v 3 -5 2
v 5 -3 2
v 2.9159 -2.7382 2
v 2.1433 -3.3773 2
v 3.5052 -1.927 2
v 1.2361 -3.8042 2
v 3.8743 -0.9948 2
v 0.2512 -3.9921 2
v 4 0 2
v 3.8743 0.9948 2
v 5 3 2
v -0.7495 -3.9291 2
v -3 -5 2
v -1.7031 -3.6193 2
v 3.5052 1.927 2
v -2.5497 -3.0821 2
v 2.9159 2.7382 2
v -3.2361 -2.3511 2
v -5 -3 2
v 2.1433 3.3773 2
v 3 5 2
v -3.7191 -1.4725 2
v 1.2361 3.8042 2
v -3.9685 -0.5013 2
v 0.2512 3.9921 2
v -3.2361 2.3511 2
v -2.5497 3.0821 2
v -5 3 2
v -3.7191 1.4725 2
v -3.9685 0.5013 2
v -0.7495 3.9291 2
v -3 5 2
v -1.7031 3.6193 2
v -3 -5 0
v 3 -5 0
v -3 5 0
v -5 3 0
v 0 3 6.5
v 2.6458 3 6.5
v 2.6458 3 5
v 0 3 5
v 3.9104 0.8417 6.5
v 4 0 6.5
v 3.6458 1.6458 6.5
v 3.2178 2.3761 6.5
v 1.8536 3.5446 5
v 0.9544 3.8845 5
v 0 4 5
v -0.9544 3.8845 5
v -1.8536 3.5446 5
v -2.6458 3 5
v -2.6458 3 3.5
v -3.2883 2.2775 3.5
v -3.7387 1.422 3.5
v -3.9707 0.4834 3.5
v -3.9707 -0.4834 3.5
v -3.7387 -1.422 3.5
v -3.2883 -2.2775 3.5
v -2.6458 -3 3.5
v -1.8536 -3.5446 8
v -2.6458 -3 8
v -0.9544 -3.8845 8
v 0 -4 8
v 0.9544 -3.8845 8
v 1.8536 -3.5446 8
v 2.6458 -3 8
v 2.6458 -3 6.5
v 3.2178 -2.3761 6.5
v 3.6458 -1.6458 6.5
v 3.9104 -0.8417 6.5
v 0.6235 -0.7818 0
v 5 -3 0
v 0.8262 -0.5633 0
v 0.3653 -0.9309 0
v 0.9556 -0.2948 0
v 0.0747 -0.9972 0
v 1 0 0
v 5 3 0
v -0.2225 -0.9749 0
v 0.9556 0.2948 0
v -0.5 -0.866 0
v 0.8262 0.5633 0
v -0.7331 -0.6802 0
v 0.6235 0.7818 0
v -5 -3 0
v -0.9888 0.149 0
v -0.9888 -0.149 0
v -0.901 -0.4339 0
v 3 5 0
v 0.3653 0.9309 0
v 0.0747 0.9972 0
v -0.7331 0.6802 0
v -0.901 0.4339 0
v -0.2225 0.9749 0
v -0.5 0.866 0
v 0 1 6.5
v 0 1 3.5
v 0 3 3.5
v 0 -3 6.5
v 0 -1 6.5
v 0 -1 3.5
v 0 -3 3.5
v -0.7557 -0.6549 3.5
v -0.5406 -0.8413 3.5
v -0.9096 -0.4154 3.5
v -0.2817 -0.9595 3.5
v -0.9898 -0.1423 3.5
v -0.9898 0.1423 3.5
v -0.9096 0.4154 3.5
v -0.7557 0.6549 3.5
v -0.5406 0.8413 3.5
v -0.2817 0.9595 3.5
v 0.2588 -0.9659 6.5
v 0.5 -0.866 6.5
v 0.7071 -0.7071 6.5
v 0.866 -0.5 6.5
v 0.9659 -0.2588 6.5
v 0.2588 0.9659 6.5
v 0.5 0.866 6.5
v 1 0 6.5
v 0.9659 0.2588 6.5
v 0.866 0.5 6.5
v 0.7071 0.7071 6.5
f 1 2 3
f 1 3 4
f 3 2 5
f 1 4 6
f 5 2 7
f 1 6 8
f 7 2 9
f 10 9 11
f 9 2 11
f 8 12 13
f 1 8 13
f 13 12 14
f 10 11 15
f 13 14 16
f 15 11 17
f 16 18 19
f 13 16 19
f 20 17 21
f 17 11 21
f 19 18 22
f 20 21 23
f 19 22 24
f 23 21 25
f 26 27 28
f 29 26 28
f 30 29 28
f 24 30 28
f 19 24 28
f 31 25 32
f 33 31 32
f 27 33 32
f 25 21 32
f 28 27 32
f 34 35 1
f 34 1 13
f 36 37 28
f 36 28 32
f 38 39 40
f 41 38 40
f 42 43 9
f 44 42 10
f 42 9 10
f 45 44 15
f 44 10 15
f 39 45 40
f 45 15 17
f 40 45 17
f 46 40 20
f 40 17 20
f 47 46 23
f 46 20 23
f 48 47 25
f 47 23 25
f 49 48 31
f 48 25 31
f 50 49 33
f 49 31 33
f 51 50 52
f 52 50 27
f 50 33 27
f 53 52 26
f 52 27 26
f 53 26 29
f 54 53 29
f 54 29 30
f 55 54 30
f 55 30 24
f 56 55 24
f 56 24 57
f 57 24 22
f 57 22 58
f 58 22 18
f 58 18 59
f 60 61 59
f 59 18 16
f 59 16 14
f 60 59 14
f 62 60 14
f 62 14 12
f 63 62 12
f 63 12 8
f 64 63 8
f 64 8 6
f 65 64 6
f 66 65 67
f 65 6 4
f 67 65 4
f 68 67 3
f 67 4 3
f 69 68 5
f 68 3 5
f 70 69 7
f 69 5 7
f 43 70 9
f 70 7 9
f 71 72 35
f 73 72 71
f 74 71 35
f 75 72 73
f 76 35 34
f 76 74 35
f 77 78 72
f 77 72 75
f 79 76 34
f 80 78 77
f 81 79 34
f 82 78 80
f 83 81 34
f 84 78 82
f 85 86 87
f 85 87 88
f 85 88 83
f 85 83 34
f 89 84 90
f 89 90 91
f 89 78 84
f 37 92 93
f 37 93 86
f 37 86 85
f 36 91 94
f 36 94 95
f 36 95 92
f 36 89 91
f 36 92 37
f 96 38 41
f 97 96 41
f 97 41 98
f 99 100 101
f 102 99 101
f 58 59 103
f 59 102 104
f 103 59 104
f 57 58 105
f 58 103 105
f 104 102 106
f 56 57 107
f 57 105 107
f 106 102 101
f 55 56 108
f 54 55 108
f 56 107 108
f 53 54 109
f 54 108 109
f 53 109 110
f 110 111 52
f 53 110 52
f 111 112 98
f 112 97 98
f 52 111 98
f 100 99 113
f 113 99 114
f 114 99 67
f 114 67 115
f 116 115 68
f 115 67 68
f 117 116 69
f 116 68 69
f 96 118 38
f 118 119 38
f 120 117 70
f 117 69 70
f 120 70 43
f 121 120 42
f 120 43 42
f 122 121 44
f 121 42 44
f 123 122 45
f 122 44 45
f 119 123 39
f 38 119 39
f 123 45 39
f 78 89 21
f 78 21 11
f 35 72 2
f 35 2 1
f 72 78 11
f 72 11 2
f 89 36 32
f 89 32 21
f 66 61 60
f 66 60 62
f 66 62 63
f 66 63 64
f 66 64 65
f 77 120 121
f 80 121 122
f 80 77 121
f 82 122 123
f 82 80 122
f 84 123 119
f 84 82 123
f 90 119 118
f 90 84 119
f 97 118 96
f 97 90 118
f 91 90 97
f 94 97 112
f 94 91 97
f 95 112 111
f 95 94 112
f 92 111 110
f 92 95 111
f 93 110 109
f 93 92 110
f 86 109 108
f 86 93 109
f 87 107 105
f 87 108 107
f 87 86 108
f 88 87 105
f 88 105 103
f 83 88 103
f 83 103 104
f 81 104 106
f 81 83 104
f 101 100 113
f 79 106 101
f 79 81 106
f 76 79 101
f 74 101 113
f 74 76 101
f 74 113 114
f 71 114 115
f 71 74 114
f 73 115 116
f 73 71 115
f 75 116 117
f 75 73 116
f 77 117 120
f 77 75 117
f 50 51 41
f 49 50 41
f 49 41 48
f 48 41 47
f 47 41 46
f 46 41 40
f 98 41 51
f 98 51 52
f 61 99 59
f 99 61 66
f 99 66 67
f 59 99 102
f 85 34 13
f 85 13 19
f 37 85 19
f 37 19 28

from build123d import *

# Parameters (mm, degrees)
SKETCH1_R           = 1
BOSS_EXTRUDE1_DEPTH = 2
SKETCH2_R           = 4
SKETCH2_R_2         = 1
BOSS_EXTRUDE2_DEPTH = 6
CUT_EXTRUDE2_DEPTH  = 8
SKETCH5_W           = 3
SKETCH5_H           = 6
CUT_EXTRUDE3_DEPTH  = 16


with BuildPart() as part:
    # Sketch1 → Boss-Extrude1 (new body)
    with BuildSketch(Plane.XY):
        Polygon((-5, 3), (-3, 5), (3, 5), (5, 3), (5, -3), (3, -5), (-3, -5), (-5, -3), align=None)
        Circle(SKETCH1_R, mode=Mode.SUBTRACT)
    extrude(amount=BOSS_EXTRUDE1_DEPTH)

    # Sketch2 → Boss-Extrude2 (add)
    with BuildSketch(Plane.XY.offset(2)):
        Circle(SKETCH2_R)
        Circle(SKETCH2_R_2, mode=Mode.SUBTRACT)
    extrude(amount=BOSS_EXTRUDE2_DEPTH)

    # Sketch4 → Cut-Extrude2 (cut, symmetric)
    with BuildSketch(Plane(origin=(0, 0, 0), x_dir=(0, 0, -1), z_dir=(1, 0, 0))):
        Polygon((-8, -3), (-6.5, -3), (-6.5, 3), (-5, 3), (-5, 4), (-8, 4), align=None)
    extrude(amount=CUT_EXTRUDE2_DEPTH, both=True, mode=Mode.SUBTRACT)

    # Sketch5 → Cut-Extrude3 (cut)
    with BuildSketch(Plane(origin=(0, 0, 0), x_dir=(0, 0, -1), z_dir=(1, 0, 0))):
        with Locations((-5, 0)):
            Rectangle(SKETCH5_W, SKETCH5_H)
    extrude(amount=-CUT_EXTRUDE3_DEPTH, mode=Mode.SUBTRACT)


solid = part.part
